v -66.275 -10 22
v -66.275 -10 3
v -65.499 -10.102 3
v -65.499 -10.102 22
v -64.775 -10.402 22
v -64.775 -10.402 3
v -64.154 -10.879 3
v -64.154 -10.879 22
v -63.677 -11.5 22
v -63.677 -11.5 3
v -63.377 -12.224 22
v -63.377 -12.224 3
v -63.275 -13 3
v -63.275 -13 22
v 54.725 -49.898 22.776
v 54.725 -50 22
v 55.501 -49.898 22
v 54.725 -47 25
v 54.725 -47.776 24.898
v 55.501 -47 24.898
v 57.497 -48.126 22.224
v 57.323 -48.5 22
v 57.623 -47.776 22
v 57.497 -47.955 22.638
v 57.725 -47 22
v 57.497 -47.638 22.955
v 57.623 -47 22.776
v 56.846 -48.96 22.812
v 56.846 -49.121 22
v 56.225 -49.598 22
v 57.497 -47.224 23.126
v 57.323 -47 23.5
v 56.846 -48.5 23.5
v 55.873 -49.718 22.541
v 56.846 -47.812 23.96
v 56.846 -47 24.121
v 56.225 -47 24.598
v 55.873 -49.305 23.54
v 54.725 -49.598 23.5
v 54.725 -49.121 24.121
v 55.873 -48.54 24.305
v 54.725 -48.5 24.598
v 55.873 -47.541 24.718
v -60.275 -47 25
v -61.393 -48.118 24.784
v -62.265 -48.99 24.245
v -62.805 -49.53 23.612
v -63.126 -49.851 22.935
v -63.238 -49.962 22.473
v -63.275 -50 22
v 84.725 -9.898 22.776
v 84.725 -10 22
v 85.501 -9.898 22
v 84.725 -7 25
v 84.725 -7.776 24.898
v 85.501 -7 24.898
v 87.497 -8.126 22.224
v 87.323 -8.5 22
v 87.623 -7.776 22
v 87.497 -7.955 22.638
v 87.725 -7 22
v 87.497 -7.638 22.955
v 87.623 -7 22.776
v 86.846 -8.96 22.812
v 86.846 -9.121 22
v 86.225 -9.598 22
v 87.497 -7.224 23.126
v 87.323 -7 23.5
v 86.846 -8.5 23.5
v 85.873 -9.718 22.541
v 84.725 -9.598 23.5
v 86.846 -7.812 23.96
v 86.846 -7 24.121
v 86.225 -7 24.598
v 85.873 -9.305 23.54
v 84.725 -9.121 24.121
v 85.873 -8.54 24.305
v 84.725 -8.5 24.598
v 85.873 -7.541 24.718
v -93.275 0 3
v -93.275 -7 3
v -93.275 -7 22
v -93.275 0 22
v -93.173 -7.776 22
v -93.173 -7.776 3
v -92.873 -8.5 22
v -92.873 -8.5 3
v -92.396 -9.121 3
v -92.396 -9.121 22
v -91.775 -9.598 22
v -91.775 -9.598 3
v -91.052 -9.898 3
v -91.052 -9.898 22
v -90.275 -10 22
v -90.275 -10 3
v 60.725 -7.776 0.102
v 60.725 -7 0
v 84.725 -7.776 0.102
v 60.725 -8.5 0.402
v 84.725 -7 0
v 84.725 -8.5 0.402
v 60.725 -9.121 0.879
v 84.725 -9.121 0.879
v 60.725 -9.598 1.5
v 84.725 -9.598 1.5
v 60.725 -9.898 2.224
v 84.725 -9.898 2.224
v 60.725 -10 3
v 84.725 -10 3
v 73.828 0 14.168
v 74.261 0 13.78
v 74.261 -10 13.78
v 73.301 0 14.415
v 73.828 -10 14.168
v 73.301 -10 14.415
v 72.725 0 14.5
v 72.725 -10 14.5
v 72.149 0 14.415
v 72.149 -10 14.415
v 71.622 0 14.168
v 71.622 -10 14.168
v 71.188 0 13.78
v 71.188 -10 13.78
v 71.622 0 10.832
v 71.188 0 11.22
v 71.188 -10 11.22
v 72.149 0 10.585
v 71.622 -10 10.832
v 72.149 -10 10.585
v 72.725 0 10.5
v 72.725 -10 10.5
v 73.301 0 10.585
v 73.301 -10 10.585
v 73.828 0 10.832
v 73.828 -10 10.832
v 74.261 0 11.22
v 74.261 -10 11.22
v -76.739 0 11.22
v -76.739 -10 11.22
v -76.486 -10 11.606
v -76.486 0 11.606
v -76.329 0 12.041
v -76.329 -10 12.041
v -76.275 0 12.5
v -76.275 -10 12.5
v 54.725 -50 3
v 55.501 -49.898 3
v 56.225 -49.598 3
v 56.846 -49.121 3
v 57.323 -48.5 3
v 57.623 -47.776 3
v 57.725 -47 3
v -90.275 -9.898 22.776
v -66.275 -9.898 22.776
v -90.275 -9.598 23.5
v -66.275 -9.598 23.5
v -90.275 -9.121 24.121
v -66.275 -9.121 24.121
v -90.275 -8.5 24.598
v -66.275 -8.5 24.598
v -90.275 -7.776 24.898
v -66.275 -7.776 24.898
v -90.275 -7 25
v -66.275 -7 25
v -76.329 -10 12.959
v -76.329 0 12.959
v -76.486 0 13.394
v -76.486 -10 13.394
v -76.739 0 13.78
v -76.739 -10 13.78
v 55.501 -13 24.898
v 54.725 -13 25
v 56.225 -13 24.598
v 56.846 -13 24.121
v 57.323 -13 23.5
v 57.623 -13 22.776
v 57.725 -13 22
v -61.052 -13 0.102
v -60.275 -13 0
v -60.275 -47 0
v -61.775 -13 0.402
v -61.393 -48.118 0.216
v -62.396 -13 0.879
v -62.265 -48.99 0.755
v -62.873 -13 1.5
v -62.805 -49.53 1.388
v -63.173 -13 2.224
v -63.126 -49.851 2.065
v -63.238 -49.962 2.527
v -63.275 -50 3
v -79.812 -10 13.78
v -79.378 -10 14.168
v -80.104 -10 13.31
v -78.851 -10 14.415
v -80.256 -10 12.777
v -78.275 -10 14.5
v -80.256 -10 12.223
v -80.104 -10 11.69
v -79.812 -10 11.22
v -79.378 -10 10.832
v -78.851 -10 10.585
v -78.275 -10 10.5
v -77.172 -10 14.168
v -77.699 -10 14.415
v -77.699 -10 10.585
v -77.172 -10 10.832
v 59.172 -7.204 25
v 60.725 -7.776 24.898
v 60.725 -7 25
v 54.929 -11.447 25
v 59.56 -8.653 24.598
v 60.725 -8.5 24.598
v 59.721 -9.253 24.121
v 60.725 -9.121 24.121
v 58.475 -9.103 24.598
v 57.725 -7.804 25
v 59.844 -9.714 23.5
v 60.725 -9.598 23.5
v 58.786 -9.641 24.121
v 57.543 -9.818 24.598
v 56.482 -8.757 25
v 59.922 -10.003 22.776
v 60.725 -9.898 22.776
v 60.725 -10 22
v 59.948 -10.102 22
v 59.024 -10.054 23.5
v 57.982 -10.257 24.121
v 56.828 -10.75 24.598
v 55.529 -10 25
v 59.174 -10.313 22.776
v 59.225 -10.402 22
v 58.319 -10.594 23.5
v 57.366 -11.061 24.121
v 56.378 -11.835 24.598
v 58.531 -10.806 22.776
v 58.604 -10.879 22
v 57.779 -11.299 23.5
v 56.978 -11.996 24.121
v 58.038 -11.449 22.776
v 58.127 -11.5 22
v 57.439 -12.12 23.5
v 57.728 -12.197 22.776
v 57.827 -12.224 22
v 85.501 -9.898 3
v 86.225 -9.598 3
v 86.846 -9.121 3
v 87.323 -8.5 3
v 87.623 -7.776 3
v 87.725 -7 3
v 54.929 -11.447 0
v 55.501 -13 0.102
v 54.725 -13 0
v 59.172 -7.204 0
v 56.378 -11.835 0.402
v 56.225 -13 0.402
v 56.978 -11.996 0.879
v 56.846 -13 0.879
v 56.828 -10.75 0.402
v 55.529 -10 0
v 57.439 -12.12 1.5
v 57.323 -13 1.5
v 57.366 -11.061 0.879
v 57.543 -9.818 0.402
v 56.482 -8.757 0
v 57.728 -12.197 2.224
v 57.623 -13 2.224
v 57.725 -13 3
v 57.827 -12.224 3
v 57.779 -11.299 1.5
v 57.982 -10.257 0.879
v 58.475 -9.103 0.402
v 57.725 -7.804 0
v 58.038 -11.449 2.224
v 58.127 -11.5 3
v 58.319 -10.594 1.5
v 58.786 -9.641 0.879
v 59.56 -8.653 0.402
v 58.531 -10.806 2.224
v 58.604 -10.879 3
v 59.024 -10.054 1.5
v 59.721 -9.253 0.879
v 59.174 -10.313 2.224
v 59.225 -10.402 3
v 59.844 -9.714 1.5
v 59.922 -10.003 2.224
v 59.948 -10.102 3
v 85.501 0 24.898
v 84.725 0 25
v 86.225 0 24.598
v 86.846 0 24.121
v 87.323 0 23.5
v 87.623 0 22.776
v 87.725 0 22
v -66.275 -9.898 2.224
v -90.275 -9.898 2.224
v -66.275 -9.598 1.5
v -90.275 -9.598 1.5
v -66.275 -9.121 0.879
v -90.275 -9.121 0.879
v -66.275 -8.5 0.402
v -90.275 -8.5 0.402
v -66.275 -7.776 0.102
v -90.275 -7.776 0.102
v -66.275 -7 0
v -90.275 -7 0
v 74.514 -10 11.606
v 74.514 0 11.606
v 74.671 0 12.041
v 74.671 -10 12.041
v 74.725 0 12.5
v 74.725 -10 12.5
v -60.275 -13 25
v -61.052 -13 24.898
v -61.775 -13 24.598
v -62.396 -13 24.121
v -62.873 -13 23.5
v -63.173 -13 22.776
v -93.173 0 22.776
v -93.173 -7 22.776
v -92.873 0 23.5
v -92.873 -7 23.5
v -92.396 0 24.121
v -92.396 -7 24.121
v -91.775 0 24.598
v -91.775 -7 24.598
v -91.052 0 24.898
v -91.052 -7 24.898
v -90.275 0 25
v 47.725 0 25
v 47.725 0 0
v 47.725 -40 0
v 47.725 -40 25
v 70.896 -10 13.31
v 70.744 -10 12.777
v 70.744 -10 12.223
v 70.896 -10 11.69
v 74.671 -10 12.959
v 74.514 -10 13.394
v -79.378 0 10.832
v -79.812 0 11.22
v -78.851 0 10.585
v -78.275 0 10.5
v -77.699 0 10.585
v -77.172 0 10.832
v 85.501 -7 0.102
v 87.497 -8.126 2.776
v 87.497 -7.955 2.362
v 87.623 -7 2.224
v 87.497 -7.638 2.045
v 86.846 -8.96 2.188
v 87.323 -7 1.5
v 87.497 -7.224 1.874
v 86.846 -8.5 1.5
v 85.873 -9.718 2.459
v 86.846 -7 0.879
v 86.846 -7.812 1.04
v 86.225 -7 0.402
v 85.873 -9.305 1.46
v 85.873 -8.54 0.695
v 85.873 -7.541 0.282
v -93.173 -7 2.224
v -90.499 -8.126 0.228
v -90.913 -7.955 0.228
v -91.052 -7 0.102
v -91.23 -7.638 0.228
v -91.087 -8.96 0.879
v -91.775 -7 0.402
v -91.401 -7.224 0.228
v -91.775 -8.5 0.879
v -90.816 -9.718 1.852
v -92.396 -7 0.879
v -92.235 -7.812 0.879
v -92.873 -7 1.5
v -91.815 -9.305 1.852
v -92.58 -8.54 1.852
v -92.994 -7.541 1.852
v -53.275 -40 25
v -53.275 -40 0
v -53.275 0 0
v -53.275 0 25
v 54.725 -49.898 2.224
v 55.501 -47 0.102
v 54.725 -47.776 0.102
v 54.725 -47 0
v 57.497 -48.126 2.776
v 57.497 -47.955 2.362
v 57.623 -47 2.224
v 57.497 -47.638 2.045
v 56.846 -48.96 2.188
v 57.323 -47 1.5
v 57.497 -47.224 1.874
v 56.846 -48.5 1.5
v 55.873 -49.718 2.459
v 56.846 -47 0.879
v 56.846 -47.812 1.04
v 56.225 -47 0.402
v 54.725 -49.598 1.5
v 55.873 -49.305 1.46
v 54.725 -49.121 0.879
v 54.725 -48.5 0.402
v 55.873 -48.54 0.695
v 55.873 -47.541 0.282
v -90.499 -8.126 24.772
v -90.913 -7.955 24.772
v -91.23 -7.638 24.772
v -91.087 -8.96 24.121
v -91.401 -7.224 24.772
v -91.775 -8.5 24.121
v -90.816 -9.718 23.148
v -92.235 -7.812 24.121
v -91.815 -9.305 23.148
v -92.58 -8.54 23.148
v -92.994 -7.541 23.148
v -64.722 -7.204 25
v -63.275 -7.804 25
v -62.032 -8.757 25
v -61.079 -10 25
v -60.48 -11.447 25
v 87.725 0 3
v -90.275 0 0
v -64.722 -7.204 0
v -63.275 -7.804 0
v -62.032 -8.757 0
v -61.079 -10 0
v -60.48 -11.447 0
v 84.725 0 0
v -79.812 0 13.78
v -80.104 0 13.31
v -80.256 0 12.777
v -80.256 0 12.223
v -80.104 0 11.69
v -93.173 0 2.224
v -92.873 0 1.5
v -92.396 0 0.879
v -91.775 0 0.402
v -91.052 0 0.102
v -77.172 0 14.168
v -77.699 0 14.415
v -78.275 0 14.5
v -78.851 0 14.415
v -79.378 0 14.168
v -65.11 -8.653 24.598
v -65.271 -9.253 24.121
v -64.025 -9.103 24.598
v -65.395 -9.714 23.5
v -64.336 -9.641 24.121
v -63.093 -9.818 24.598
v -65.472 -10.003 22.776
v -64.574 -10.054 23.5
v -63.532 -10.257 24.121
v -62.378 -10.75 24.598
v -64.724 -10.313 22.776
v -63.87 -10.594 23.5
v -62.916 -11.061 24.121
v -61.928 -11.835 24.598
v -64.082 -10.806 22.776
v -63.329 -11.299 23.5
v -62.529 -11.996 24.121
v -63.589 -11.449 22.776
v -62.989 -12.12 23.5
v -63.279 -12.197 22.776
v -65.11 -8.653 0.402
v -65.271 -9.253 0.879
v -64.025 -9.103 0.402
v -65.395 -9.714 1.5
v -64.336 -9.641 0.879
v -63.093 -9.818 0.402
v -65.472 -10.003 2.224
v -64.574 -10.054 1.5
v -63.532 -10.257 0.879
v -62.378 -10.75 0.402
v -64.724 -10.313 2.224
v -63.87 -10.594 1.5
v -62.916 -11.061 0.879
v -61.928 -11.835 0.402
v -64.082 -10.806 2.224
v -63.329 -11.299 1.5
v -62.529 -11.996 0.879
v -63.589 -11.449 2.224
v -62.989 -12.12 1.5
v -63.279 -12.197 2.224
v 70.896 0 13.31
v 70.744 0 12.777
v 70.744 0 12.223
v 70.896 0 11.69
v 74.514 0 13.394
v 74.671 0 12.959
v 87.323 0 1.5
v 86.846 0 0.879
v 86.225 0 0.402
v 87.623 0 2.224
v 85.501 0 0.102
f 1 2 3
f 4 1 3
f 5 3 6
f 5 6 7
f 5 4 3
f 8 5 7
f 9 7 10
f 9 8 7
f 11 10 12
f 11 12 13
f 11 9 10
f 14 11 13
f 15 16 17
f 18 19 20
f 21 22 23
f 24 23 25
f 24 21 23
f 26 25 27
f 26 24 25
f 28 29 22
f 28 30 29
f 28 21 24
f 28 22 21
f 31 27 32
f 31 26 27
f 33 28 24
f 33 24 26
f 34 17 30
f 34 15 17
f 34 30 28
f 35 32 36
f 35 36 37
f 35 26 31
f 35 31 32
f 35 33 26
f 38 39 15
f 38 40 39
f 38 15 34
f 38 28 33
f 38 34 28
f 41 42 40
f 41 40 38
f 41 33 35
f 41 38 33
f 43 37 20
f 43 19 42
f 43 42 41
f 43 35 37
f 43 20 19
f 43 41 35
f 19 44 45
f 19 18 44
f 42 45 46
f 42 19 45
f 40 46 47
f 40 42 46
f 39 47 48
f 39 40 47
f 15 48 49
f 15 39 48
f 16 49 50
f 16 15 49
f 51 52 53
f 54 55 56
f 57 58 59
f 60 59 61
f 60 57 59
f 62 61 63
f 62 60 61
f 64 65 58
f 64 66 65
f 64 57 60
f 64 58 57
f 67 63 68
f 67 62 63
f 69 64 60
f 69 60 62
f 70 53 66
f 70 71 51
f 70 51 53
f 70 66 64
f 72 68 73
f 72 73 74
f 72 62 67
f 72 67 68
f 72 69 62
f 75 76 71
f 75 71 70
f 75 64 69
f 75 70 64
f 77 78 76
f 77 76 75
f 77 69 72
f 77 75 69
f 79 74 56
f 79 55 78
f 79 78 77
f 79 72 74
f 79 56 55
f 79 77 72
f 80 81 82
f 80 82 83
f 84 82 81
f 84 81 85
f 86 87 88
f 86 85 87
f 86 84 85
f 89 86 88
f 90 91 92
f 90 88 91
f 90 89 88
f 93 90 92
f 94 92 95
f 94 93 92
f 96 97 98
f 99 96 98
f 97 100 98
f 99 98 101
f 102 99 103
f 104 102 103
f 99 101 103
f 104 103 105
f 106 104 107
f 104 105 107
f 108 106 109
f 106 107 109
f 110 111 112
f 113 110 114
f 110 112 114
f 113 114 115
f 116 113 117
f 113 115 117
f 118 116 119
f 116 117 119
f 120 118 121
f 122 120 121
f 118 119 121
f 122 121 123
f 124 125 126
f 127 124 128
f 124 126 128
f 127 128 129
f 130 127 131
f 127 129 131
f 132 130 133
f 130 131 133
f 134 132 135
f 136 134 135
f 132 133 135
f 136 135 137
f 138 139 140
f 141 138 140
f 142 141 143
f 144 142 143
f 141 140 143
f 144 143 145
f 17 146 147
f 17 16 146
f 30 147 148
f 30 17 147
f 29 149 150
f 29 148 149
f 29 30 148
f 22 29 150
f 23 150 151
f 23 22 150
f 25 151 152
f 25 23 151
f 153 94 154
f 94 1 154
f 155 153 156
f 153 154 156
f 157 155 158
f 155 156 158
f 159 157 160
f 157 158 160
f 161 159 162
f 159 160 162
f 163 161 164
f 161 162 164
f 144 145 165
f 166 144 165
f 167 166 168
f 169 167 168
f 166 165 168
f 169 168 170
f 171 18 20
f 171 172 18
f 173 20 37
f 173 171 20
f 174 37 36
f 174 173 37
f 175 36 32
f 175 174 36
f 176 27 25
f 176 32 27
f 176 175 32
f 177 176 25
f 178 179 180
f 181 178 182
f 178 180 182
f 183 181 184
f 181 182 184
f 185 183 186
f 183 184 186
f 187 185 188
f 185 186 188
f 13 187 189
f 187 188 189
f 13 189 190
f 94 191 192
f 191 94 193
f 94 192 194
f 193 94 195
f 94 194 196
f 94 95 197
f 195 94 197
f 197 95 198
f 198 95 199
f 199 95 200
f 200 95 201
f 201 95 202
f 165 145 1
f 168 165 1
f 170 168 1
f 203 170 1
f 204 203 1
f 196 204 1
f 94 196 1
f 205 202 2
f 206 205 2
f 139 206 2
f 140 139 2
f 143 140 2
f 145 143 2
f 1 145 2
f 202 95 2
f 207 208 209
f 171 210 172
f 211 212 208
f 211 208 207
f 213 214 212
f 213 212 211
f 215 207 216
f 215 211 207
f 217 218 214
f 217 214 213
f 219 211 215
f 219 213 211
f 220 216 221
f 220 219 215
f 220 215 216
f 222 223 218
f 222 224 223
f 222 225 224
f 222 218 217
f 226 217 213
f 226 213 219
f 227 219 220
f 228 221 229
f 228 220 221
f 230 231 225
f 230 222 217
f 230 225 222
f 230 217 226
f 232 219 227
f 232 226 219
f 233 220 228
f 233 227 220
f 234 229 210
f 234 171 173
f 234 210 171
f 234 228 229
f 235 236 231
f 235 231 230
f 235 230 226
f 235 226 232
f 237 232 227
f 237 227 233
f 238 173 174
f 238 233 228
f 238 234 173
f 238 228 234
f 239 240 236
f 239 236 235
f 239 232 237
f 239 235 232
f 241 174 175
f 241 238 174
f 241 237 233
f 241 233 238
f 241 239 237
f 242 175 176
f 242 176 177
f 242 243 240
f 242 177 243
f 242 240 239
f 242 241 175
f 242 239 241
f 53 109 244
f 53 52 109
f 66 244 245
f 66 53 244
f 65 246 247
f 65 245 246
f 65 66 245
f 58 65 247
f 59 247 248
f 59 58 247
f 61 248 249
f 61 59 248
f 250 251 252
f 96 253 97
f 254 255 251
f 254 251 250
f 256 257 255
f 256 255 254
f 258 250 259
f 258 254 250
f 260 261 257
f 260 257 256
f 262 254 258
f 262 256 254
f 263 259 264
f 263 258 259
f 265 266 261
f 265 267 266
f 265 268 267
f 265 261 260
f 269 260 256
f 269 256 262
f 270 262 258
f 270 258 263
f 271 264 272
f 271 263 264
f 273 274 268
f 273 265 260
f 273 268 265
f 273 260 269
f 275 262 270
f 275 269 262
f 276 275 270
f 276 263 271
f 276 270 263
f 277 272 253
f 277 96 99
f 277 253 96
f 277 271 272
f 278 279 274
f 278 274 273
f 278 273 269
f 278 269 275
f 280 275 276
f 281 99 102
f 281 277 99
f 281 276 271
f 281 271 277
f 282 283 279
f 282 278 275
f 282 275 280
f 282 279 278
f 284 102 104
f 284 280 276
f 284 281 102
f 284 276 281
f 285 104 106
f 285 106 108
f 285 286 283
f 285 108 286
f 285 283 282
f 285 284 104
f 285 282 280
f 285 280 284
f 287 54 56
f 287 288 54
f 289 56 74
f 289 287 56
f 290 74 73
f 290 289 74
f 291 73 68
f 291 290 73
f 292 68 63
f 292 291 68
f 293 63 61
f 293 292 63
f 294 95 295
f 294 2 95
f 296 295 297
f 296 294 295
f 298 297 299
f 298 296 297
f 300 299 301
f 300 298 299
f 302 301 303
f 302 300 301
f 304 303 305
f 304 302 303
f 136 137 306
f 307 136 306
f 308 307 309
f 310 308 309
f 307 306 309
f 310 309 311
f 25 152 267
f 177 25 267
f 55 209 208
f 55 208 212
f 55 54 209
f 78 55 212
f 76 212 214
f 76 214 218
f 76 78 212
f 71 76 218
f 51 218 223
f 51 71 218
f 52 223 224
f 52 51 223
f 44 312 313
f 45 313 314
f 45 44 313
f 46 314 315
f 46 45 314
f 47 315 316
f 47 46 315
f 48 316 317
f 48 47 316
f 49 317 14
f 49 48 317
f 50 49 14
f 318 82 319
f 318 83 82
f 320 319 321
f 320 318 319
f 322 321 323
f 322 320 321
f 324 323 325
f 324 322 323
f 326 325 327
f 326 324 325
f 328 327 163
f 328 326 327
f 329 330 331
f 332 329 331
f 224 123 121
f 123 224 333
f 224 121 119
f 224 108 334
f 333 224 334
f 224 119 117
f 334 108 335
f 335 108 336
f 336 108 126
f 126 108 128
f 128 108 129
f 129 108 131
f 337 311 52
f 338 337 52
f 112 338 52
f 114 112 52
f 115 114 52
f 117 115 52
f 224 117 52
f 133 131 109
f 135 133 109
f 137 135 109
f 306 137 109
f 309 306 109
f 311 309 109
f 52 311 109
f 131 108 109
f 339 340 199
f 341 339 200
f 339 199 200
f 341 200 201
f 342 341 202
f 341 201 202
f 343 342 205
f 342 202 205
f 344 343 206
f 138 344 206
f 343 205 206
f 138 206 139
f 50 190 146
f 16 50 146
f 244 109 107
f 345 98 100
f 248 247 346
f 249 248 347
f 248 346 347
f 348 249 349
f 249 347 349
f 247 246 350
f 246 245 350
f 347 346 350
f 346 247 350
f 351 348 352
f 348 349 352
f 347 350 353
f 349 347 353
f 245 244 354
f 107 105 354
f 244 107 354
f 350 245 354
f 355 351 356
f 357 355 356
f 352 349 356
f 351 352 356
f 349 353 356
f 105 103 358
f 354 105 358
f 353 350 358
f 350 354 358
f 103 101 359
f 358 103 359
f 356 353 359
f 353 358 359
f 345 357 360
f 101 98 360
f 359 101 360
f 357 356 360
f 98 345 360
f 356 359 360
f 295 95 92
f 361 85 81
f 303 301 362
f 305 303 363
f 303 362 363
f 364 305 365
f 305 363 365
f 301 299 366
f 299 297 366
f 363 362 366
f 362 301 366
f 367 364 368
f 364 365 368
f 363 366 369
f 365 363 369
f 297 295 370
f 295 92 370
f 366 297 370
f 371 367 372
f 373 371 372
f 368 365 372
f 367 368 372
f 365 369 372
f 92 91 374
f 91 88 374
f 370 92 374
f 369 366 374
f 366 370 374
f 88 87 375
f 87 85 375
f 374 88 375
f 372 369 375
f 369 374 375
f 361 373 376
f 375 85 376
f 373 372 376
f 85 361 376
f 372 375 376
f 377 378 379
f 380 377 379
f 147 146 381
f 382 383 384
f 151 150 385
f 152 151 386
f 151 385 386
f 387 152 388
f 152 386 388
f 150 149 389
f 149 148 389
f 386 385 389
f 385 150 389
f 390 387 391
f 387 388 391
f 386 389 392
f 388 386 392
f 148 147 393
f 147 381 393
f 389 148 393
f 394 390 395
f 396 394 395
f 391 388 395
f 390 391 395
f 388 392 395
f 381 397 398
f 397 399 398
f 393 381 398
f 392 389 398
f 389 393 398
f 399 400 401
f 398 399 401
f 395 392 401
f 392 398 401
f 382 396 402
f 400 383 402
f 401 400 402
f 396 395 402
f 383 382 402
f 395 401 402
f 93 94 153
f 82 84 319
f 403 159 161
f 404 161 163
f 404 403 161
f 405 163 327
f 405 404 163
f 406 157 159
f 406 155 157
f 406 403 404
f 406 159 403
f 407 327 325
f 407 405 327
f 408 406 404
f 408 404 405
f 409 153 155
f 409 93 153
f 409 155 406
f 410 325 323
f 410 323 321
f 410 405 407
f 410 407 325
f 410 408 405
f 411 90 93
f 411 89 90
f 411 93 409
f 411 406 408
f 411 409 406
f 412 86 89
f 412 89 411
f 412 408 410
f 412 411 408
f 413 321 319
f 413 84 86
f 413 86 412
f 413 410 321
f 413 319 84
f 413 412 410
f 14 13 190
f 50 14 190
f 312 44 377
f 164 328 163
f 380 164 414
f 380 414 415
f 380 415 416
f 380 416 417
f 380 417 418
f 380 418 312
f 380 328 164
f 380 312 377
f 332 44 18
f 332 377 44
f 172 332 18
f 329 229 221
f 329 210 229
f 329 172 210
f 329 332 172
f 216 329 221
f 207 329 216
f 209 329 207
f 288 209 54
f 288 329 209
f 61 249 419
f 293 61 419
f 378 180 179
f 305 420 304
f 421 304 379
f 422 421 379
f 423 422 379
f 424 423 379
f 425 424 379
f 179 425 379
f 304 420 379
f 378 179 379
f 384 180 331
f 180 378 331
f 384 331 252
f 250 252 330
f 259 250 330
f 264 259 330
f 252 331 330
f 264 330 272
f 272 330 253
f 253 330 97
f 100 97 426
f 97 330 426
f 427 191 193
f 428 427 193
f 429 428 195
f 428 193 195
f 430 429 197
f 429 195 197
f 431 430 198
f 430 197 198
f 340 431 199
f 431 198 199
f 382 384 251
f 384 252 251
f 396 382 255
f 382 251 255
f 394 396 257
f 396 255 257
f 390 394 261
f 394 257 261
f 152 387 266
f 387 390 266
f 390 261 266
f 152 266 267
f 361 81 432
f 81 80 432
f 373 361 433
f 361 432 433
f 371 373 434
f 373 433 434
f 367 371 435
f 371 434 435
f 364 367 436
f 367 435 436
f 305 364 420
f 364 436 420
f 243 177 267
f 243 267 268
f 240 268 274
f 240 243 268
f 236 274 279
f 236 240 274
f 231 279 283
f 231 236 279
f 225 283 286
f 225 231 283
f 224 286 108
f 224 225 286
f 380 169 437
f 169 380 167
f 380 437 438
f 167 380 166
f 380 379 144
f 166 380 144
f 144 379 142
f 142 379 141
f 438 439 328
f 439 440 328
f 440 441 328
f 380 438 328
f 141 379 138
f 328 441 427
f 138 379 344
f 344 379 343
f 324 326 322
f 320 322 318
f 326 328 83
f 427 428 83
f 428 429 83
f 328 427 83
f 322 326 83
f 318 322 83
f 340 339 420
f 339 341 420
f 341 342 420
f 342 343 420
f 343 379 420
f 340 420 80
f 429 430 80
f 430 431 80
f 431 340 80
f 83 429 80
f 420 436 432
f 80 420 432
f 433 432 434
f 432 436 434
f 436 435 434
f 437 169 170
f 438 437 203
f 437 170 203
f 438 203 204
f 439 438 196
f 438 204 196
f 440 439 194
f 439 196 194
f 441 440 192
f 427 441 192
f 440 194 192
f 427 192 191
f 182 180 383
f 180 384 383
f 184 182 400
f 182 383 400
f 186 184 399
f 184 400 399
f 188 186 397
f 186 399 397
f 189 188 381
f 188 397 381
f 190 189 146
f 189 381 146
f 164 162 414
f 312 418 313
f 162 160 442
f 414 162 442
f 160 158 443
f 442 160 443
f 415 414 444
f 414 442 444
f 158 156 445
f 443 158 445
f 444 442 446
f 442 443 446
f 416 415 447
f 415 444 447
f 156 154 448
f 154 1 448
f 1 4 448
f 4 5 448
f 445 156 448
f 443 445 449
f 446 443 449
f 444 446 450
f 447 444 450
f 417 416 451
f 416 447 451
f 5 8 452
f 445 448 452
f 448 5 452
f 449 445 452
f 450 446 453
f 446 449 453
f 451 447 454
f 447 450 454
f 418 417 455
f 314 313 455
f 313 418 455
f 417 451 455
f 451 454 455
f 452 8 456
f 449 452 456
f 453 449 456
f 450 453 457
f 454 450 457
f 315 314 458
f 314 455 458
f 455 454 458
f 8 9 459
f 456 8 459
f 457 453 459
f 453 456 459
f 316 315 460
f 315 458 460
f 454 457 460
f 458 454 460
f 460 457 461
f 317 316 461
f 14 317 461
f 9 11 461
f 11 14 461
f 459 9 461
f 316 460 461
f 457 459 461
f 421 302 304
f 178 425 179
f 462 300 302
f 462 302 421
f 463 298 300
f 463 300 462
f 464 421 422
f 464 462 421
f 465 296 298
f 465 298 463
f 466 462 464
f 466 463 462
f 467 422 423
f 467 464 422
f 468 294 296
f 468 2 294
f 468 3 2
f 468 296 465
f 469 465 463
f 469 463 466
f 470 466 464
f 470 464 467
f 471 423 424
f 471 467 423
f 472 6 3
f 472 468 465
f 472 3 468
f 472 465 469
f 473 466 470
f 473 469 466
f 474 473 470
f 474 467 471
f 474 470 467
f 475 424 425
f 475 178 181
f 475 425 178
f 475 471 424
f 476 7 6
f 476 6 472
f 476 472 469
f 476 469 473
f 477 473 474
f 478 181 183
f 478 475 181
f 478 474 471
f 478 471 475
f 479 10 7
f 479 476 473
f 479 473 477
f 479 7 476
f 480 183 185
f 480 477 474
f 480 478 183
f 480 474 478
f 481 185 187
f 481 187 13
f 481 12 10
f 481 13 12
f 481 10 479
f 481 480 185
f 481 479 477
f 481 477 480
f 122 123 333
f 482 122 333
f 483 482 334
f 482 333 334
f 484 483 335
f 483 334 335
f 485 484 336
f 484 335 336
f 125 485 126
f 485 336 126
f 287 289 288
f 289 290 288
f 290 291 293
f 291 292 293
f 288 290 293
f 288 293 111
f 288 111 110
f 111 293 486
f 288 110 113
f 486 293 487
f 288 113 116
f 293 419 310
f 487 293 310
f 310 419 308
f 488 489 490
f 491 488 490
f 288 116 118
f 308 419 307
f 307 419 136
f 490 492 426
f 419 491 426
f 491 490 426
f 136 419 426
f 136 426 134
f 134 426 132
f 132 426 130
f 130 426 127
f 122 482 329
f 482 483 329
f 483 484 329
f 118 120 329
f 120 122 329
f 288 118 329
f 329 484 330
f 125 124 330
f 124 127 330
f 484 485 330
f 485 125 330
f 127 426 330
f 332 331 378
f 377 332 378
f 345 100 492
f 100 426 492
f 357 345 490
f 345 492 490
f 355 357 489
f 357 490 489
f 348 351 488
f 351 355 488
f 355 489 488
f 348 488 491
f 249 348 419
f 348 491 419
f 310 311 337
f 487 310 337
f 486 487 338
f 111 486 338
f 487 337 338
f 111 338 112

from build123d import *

# Parameters (mm, degrees)
F0_W     = 30
F0_H     = 10
F0_W_2   = 10
F0_H_2   = 30
F1_DEPTH = 25
F3_DEPTH = 25
F5_DEPTH = 25
F6_R     = 3


with BuildPart() as f1:
    # F0 (on Top) → F1 (new body)
    with BuildSketch(Plane.XY):
        with Locations((-78.2751372457, -5)):
            Rectangle(F0_W, F0_H)
        with Locations((-58.2751372457, -25)):
            Rectangle(F0_W_2, F0_H_2)
        Polygon((47.7248627543, 0), (47.7248627543, -40), (57.7248627543, -40), (57.7248627543, -10), (87.7248627543, -10), (87.7248627543, 0), align=None)
        with Locations((-58.2751372457, -5)):
            Rectangle(F0_W_2, F0_H)
        Polygon((47.7248627543, -40), (-53.2751372457, -40), (-63.2751372457, -40), (-63.2751372457, -50), (57.7248627543, -50), (57.7248627543, -40), align=None)
    extrude(amount=F1_DEPTH)

    # F2 (on face) → F3 (cut)
    with BuildSketch(Plane.XZ.offset(10)):
        with BuildLine():
            Line((74.2613053135, 13.7803687993), (72.7248627543, 12.5))
            Line((72.7248627543, 12.5), (74.2613053135, 11.2196312007))
            ThreePointArc((74.2613053135, 11.2196312007), (74.6054059097, 11.8191494725), (74.7248627543, 12.5))
            ThreePointArc((74.7248627543, 12.5), (74.6054059097, 13.1808505275), (74.2613053135, 13.7803687993))
        make_face()
        with BuildLine():
            Line((71.1884201952, 13.7803687993), (72.7248627543, 12.5))
            Line((72.7248627543, 12.5), (74.2613053135, 13.7803687993))
            ThreePointArc((74.2613053135, 13.7803687993), (72.7248627543, 14.5), (71.1884201952, 13.7803687993))
        make_face()
        with BuildLine():
            ThreePointArc((71.1884201952, 13.7803687993), (70.7248627543, 12.5), (71.1884201952, 11.2196312007))
            Line((71.1884201952, 11.2196312007), (72.7248627543, 12.5))
            Line((72.7248627543, 12.5), (71.1884201952, 13.7803687993))
        make_face()
        with BuildLine():
            Line((72.7248627543, 12.5), (71.1884201952, 11.2196312007))
            ThreePointArc((71.1884201952, 11.2196312007), (72.7248627543, 10.5), (74.2613053135, 11.2196312007))
            Line((74.2613053135, 11.2196312007), (72.7248627543, 12.5))
        make_face()
    extrude(amount=-F3_DEPTH, mode=Mode.SUBTRACT)

    # F4 (on face) → F5 (cut)
    with BuildSketch(Plane.XZ.offset(10)):
        with BuildLine():
            ThreePointArc((-79.8115798048, 11.2196312007), (-78.2751372457, 10.5), (-76.7386946865, 11.2196312007))
            Line((-76.7386946865, 11.2196312007), (-78.2751372457, 12.5))
            Line((-78.2751372457, 12.5), (-79.8115798048, 11.2196312007))
        make_face()
        with BuildLine():
            Line((-78.2751372457, 12.5), (-76.7386946865, 11.2196312007))
            ThreePointArc((-76.7386946865, 11.2196312007), (-76.3945940903, 11.8191494725), (-76.2751372457, 12.5))
            ThreePointArc((-76.2751372457, 12.5), (-76.3945940903, 13.1808505275), (-76.7386946865, 13.7803687993))
            Line((-76.7386946865, 13.7803687993), (-78.2751372457, 12.5))
        make_face()
        with BuildLine():
            Line((-79.8115798048, 13.7803687993), (-78.2751372457, 12.5))
            Line((-78.2751372457, 12.5), (-76.7386946865, 13.7803687993))
            ThreePointArc((-76.7386946865, 13.7803687993), (-78.2751372457, 14.5), (-79.8115798048, 13.7803687993))
        make_face()
        with BuildLine():
            Line((-79.8115798048, 11.2196312007), (-78.2751372457, 12.5))
            Line((-78.2751372457, 12.5), (-79.8115798048, 13.7803687993))
            ThreePointArc((-79.8115798048, 13.7803687993), (-80.2751372457, 12.5), (-79.8115798048, 11.2196312007))
        make_face()
    extrude(amount=-F5_DEPTH, mode=Mode.SUBTRACT)

    # F6
    f6_edges = [f1.edges().sort_by_distance(p)[0] for p in [
        (-93.275137, -10, 12.5),
        (-78.275137, -10, 0),
        (-63.275137, -30, 0),
        (-63.275137, -30, 25),
        (-63.275137, -10, 12.5),
        (-78.275137, -10, 25),
        (-2.775137, -50, 0),
        (-2.775137, -50, 25),
        (-93.275137, -5, 0),
        (57.724863, -50, 12.5),
        (57.724863, -30, 0),
        (72.724863, -10, 0),
        (72.724863, -10, 25),
        (87.724863, -10, 12.5),
        (87.724863, -5, 0),
        (87.724863, -5, 25),
        (57.724863, -30, 25),
        (57.724863, -10, 12.5),
        (-93.275137, -5, 25),
    ]]
    fillet(f6_edges, radius=F6_R)


solid = f1.part
